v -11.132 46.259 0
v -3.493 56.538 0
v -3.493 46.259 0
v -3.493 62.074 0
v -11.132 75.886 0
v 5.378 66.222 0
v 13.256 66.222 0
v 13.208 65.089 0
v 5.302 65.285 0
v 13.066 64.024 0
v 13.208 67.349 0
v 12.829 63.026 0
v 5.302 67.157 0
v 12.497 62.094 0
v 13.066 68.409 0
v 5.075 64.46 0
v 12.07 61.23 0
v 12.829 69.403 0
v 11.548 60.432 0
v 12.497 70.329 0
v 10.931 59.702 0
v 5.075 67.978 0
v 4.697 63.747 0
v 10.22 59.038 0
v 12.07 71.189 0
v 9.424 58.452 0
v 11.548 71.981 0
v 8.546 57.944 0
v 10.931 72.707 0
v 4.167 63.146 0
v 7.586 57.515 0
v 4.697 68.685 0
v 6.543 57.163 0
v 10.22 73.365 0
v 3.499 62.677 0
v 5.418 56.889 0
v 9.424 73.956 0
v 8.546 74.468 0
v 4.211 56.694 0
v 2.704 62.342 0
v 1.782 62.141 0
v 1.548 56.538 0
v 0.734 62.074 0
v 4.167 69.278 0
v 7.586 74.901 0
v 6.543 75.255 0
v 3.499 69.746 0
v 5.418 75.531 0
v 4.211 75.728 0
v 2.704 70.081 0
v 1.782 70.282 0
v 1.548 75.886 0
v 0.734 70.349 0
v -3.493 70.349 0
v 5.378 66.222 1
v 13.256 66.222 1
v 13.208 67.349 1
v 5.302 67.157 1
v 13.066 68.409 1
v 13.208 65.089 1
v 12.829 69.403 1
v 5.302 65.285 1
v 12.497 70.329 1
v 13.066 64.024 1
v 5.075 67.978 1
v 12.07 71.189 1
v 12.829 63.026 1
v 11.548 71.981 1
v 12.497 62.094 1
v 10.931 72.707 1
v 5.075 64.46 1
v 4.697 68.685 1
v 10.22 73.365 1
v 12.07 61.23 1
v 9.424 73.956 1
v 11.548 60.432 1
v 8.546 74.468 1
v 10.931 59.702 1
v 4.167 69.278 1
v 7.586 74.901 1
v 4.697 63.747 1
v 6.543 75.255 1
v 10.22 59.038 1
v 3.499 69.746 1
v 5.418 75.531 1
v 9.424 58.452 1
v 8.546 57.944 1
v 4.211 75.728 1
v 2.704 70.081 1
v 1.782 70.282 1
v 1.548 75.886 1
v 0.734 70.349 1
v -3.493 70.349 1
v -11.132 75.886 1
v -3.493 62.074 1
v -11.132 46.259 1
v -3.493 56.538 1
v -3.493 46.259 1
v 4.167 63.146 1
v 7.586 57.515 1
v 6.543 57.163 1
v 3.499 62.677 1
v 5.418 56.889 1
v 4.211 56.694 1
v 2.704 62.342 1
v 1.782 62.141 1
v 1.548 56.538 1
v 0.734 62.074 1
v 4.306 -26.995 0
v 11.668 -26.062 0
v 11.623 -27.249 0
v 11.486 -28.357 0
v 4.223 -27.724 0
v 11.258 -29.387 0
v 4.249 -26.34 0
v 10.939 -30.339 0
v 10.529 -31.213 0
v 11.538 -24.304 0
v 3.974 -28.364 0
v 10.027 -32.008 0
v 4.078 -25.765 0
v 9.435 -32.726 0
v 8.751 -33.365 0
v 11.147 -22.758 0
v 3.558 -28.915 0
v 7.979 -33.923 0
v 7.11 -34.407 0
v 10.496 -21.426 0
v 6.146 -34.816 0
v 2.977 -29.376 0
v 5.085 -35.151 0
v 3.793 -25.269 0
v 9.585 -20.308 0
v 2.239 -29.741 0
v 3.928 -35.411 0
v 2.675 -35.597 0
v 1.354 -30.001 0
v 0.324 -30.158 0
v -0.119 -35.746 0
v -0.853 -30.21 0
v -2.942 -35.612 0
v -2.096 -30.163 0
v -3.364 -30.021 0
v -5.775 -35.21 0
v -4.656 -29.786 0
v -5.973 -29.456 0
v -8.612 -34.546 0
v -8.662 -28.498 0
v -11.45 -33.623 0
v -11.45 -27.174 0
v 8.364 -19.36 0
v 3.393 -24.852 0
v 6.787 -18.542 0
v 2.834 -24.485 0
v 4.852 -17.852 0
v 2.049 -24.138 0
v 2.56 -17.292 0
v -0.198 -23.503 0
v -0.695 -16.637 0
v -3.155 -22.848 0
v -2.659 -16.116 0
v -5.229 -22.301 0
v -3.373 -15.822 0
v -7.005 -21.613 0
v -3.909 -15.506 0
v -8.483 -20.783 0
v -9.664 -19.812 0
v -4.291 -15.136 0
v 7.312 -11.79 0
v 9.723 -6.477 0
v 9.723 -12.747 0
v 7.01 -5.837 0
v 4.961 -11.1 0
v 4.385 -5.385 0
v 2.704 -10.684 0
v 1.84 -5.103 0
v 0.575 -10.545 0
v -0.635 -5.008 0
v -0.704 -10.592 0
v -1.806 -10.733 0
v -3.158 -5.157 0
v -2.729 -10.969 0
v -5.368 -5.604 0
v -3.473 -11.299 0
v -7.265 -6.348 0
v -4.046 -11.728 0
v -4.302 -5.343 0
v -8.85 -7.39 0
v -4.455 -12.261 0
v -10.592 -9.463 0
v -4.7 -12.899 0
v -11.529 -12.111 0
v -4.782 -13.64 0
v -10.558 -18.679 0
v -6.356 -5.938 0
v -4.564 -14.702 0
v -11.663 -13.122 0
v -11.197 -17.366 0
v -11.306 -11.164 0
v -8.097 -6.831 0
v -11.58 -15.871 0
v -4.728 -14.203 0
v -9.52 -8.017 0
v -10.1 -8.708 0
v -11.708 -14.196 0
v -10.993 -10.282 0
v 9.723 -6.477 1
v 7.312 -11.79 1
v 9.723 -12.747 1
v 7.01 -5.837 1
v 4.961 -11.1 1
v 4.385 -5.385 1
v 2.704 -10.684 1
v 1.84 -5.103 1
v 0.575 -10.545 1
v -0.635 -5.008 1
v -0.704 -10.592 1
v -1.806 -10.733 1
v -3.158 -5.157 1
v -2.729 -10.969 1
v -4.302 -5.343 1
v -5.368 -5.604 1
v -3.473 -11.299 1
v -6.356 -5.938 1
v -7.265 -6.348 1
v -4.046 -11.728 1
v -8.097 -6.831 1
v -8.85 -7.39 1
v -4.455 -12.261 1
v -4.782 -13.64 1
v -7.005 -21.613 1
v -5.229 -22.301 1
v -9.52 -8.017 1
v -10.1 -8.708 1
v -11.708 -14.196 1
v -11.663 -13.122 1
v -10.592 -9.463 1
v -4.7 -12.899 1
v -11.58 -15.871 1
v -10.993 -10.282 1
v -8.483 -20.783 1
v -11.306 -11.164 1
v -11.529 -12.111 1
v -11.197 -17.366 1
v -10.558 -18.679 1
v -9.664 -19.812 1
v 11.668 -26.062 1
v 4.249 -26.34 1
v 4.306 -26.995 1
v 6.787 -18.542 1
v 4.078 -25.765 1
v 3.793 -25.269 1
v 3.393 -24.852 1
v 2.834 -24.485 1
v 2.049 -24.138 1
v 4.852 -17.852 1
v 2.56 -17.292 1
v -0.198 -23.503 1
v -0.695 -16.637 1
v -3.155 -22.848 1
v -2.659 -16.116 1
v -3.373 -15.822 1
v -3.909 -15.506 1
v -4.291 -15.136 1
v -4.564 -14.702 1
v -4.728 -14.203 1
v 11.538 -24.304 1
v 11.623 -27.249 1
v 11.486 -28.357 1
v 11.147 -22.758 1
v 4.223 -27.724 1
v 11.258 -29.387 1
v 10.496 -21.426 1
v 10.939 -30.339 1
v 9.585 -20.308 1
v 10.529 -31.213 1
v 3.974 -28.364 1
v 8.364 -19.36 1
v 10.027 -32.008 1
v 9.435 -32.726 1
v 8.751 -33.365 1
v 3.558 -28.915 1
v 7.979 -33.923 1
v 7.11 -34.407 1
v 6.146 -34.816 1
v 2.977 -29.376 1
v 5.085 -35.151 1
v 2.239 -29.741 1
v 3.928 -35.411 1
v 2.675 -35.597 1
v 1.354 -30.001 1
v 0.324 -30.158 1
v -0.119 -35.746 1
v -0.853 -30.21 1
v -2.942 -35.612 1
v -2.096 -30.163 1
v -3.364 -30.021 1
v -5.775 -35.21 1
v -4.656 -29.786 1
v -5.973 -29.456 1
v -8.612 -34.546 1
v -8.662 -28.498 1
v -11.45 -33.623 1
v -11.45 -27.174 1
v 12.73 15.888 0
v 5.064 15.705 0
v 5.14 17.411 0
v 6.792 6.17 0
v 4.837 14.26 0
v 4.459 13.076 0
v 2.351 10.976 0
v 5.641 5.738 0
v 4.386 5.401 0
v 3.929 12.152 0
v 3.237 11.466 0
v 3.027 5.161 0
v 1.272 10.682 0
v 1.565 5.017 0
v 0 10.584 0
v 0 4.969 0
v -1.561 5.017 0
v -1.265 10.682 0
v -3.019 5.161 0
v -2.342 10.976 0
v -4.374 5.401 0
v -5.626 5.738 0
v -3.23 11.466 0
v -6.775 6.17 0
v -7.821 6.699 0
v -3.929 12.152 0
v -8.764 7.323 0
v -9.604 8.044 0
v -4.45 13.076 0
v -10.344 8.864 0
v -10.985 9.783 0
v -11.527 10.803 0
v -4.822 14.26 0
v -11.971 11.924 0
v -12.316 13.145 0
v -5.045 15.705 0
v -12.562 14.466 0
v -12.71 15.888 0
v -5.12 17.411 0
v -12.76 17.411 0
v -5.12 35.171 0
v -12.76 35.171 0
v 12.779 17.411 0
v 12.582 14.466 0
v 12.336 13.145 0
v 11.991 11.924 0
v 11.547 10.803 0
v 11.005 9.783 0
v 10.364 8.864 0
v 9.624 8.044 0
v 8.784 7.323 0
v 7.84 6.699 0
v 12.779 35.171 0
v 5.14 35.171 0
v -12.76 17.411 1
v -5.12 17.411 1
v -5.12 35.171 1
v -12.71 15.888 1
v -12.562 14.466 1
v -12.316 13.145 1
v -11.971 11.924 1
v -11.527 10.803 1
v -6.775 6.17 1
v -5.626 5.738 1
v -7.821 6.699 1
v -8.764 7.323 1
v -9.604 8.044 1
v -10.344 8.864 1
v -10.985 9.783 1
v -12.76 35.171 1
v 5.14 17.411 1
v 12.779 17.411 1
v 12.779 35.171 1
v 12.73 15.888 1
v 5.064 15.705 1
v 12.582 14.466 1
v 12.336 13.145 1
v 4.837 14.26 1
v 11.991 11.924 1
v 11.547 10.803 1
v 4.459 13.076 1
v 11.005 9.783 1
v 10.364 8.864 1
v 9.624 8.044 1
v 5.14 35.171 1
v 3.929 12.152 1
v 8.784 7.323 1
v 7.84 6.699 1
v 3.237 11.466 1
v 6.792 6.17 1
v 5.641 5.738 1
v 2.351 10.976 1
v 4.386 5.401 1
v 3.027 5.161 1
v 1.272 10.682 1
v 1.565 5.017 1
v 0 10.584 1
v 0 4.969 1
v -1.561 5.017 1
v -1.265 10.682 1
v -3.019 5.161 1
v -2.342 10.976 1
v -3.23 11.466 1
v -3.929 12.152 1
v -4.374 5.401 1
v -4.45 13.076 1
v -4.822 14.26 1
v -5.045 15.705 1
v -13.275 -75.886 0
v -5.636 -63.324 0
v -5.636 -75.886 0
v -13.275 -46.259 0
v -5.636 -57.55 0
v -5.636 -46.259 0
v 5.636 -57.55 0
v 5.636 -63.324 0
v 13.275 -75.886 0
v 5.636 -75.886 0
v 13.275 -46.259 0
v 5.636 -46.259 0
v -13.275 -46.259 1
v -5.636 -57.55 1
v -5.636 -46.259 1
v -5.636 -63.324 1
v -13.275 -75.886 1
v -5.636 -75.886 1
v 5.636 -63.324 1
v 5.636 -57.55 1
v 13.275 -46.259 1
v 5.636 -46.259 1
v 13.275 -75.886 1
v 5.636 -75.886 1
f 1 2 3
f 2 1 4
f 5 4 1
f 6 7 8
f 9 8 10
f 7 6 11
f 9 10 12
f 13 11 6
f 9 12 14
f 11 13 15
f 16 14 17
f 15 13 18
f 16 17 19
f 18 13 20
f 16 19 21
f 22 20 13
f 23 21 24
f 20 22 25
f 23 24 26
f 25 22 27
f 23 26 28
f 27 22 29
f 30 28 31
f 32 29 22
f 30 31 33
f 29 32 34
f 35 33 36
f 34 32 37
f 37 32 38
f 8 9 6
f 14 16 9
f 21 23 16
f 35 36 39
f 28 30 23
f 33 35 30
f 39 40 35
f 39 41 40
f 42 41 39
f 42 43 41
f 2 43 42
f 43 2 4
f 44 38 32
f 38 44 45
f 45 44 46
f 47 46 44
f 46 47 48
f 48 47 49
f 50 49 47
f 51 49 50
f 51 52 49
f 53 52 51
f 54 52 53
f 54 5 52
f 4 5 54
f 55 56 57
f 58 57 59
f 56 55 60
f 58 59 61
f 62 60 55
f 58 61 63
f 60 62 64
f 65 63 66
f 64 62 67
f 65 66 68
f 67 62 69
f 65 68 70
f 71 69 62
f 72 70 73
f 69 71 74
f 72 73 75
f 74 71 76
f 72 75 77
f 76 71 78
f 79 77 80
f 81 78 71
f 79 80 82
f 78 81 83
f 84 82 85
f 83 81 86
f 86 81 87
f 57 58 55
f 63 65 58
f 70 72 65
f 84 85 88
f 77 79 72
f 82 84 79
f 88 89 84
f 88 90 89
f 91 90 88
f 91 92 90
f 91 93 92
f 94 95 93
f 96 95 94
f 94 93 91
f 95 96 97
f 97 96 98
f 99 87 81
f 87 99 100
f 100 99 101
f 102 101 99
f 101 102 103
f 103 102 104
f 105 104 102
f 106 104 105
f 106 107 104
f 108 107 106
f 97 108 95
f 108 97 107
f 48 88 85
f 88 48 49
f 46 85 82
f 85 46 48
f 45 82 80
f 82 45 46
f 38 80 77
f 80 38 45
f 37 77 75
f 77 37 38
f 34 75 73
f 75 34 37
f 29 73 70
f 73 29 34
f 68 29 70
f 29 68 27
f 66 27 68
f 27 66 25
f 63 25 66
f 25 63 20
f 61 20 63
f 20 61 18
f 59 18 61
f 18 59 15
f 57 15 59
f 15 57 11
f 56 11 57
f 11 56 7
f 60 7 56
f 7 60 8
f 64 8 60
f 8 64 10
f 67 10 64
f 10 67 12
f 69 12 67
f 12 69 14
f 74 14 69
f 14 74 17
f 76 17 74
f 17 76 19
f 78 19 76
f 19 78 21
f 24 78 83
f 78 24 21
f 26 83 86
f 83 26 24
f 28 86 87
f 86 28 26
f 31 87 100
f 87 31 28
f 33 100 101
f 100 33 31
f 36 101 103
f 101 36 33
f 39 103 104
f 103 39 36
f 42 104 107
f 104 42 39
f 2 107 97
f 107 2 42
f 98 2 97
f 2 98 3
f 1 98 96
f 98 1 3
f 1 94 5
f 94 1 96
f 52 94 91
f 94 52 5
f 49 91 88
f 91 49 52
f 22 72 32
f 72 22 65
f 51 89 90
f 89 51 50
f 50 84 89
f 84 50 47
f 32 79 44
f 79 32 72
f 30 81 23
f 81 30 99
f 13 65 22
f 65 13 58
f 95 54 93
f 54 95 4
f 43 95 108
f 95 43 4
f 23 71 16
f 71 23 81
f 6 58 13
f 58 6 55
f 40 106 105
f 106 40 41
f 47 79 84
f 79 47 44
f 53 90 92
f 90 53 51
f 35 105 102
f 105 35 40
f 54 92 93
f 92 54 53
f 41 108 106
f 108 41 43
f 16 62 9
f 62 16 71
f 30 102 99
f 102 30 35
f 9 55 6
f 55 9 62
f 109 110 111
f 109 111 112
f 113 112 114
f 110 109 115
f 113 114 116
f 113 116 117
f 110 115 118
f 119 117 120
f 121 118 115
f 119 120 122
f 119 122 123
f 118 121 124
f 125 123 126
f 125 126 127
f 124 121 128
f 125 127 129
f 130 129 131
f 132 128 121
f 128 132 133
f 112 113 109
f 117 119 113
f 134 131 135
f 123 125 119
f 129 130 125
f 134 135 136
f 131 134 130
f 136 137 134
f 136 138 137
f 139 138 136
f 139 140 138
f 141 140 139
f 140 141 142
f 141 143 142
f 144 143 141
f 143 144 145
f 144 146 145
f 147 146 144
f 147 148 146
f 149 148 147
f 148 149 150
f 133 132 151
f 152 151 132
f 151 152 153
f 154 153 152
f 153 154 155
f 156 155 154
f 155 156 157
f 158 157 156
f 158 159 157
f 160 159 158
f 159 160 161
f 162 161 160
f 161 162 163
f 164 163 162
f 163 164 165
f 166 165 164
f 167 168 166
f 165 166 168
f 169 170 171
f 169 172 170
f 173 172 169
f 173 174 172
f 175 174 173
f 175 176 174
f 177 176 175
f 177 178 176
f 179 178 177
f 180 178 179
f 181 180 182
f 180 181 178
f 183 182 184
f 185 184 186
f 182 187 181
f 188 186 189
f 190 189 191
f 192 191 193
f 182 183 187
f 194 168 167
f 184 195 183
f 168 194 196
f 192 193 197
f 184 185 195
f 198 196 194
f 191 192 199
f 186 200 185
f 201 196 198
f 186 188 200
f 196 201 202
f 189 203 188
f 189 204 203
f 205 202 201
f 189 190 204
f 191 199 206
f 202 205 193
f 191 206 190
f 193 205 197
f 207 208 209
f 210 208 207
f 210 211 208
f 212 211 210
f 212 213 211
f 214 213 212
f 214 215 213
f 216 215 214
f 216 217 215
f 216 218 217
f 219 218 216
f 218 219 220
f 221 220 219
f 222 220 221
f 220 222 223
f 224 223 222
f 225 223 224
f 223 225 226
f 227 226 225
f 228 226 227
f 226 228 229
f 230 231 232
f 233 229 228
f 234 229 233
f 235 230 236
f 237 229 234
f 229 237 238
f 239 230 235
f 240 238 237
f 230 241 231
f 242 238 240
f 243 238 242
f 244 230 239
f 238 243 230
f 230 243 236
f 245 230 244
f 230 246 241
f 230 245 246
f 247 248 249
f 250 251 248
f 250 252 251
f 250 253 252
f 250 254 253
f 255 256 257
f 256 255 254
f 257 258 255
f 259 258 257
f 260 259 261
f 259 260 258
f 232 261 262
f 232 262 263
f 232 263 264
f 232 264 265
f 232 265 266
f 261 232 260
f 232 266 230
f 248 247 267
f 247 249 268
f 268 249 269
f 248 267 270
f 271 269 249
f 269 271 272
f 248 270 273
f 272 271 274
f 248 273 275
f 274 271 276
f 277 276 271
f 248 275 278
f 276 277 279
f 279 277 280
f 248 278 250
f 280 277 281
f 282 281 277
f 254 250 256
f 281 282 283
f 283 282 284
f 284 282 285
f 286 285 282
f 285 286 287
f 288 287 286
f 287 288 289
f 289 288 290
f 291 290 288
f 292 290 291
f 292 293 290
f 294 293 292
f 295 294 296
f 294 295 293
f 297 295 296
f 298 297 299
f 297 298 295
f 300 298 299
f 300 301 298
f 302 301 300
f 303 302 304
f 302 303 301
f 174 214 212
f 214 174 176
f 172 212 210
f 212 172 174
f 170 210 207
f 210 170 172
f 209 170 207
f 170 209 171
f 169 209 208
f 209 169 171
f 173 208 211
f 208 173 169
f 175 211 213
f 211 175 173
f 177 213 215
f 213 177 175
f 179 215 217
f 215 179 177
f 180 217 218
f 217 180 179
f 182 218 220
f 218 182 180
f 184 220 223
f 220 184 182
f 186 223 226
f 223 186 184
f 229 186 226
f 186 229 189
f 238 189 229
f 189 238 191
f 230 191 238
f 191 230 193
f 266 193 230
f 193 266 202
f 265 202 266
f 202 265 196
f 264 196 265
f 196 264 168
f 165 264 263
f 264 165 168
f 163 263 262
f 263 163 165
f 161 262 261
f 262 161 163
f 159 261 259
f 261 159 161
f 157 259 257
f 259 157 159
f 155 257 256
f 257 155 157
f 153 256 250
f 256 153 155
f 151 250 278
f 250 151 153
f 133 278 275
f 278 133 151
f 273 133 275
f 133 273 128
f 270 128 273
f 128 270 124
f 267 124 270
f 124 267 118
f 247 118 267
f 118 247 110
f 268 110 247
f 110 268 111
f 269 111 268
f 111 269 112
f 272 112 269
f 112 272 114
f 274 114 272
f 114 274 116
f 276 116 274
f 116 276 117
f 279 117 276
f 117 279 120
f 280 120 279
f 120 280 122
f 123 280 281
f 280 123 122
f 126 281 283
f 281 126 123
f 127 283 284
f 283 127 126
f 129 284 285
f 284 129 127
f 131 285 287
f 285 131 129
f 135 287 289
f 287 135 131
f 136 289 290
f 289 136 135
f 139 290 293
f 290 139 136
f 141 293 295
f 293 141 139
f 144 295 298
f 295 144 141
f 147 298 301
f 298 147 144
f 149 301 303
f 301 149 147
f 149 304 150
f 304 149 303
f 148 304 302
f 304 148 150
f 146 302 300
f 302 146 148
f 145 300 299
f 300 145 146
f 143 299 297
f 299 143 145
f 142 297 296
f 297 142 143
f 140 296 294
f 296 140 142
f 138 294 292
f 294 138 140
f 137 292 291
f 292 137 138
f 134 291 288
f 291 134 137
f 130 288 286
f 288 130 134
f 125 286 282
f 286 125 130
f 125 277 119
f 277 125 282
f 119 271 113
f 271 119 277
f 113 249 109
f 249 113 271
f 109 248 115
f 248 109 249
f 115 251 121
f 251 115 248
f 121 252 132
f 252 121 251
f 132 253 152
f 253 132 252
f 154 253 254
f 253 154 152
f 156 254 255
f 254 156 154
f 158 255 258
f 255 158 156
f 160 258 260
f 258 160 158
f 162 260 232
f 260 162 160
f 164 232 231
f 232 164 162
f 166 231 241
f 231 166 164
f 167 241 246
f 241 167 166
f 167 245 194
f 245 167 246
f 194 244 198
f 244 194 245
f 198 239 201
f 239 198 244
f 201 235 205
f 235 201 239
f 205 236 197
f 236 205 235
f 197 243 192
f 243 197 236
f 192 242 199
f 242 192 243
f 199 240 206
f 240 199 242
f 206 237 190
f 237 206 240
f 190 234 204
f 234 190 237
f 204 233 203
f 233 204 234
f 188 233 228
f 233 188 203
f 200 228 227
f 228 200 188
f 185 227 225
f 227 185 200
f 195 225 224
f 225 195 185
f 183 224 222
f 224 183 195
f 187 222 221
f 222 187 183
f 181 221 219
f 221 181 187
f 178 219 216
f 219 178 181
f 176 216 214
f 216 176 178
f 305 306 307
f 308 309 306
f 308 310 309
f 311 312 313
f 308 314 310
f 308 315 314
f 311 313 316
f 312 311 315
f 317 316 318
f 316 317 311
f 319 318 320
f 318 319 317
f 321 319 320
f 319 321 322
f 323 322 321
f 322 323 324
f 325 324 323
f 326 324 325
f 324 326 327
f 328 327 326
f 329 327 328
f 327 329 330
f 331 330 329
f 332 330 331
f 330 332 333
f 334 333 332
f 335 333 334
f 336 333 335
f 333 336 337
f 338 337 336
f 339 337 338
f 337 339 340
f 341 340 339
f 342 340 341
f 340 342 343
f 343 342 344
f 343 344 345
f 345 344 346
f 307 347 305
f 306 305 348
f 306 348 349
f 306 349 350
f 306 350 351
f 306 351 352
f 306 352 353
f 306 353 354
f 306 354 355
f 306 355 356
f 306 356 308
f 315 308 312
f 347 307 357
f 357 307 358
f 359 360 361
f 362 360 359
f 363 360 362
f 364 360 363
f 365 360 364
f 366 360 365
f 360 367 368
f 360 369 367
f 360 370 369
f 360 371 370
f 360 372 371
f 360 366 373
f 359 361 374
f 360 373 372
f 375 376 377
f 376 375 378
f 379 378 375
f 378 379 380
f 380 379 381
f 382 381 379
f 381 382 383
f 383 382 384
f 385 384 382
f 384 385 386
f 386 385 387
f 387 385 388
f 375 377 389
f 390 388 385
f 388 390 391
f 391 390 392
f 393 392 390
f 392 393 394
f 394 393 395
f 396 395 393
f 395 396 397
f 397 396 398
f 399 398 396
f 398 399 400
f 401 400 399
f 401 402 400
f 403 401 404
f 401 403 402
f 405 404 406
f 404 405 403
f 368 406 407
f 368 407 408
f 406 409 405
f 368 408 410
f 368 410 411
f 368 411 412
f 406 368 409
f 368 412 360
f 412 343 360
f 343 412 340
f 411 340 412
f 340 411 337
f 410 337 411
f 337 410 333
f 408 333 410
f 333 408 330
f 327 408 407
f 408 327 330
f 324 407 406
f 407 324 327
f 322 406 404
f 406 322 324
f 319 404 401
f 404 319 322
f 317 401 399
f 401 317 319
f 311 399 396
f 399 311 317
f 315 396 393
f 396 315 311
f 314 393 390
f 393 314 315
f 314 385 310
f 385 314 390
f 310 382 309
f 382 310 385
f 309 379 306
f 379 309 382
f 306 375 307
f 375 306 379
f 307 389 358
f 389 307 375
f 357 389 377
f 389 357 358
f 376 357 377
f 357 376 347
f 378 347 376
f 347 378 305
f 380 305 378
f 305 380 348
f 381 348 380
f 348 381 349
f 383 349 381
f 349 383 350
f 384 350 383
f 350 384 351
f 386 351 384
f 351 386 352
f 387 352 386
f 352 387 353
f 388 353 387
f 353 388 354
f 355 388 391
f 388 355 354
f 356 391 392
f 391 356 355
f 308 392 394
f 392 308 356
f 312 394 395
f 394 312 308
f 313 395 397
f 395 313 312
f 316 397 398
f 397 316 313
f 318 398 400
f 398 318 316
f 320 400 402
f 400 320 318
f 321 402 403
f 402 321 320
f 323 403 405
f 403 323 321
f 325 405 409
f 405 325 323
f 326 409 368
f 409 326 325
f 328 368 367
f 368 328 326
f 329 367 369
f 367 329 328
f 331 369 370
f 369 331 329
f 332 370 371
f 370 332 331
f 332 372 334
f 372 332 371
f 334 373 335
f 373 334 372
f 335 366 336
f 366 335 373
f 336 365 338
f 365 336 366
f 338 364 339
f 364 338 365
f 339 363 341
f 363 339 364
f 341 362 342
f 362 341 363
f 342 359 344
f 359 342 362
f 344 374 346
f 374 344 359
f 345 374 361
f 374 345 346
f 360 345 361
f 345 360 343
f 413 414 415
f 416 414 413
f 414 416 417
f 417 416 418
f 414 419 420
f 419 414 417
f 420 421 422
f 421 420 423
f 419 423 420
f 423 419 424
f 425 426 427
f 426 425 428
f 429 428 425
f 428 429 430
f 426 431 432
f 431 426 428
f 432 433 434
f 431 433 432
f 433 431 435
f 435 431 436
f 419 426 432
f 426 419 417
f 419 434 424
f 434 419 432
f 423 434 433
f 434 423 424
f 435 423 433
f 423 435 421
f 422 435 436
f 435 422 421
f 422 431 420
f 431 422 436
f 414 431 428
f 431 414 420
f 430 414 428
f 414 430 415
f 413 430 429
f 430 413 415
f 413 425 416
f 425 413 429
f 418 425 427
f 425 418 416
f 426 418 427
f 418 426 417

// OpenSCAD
// Module names are of the form poly_<inkscape-path-id>().  As a result,
// you can associate a polygon in this OpenSCAD program with the corresponding
// SVG element in the Inkscape document by looking for the XML element with
// the attribute id="inkscape-path-id".

// fudge value is used to ensure that subtracted solids are a tad taller
// in the z dimension than the polygon being subtracted from.  This helps
// keep the resulting .stl file manifold.
fudge = 0.1;

module poly_path2990(h)
{
  scale([25.4/90, -25.4/90, 1]) union()
  {
    difference()
    {
       linear_extrude(height=h)
         polygon([[-39.445310,-268.885770],[5.484380,-268.885770],[14.919395,-268.327609],[19.198559,-267.629963],[23.185492,-266.653275],[26.880197,-265.397543],[30.282673,-263.862769],[33.392921,-262.048951],[36.210940,-259.956090],[38.732271,-257.622564],[40.917428,-255.051743],[42.766413,-252.243624],[44.279225,-249.198210],[45.455864,-245.915499],[46.296332,-242.395493],[46.800627,-238.638189],[46.968750,-234.643590],[46.800627,-230.631362],[46.296332,-226.856446],[45.455864,-223.318841],[44.279225,-220.018546],[42.766413,-216.955561],[40.917428,-214.129886],[38.732271,-211.541519],[36.210940,-209.190460],[33.392921,-207.114031],[30.282673,-205.314462],[26.880197,-203.791752],[23.185492,-202.545901],[19.198559,-201.576910],[14.919395,-200.884778],[5.484380,-200.331090],[-12.375000,-200.331090],[-12.375000,-163.909210],[-39.445310,-163.909210],[-39.445310,-268.885770]]);
       translate([0, 0, -fudge])
         linear_extrude(height=h+2*fudge)
           polygon([[-12.375000,-249.268590],[-12.375000,-219.948270],[2.601560,-219.948270],[6.314906,-220.185546],[9.580033,-220.897450],[12.396941,-222.083984],[14.765630,-223.745150],[16.642053,-225.876461],[17.982371,-228.403304],[18.786584,-231.325680],[19.054690,-234.643590],[18.786584,-237.957021],[17.982371,-240.866184],[16.642053,-243.371080],[14.765630,-245.471710],[12.396941,-247.132797],[9.580033,-248.319305],[6.314906,-249.031235],[2.601560,-249.268590],[-12.375000,-249.268590]]);
    }
  }
}

module poly_path2994(h)
{
  scale([25.4/90, -25.4/90, 1]) union()
  {
    linear_extrude(height=h)
      polygon([[34.453130,22.948910],[34.453130,45.167660],[25.910101,41.775147],[17.578130,39.331730],[9.580036,37.855228],[2.039060,37.362980],[-2.496119,37.530018],[-6.398470,38.031010],[-9.667994,38.865955],[-12.304690,40.034850],[-14.334981,41.555404],[-15.785183,43.445069],[-16.655293,45.703845],[-16.945310,48.331730],[-16.751973,50.326886],[-16.171903,52.093499],[-15.205098,53.631570],[-13.851560,54.941100],[-11.953147,56.061742],[-9.421905,57.103259],[-2.460940,58.948910],[9.070310,61.269230],[17.191365,63.255590],[24.046819,65.698959],[29.636675,68.599338],[33.960940,71.956730],[37.190867,75.920619],[39.497979,80.640351],[40.882273,86.115928],[41.343750,92.347350],[41.182222,96.550727],[40.697704,100.477245],[39.890196,104.126906],[38.759699,107.499709],[37.306212,110.595654],[35.529735,113.414743],[33.430267,115.956974],[31.007810,118.222350],[28.271093,120.199889],[25.193808,121.913756],[21.775953,123.363952],[18.017529,124.550475],[13.918535,125.473327],[9.478970,126.132506],[-0.421870,126.659850],[-10.423859,126.185241],[-20.460940,124.761410],[-30.515640,122.405945],[-40.570310,119.136410],[-40.570310,96.284850],[-30.691419,100.978224],[-21.164060,104.370790],[-16.497091,105.539746],[-11.917999,106.374709],[-7.426782,106.875680],[-3.023440,107.042660],[1.146941,106.858102],[4.798786,106.304396],[7.932098,105.381543],[10.546880,104.089540],[12.607878,102.454786],[14.080033,100.503618],[14.963343,98.236036],[15.257810,95.652040],[15.055627,93.331744],[14.449170,91.292688],[13.438440,89.534869],[12.023440,88.058290],[10.041471,86.757531],[7.259723,85.527070],[-0.703120,83.277040],[-11.179690,80.956730],[-18.527362,79.018765],[-24.820334,76.579809],[-30.058609,73.639858],[-34.242190,70.198910],[-37.410649,66.186740],[-39.673833,61.532945],[-41.031739,56.237525],[-41.484370,50.300480],[-41.326171,46.493742],[-40.851565,42.913317],[-40.060552,39.559203],[-38.953131,36.431400],[-37.529303,33.529908],[-35.789067,30.854726],[-33.732423,28.405853],[-31.359370,26.183290],[-28.689702,24.205784],[-25.743177,22.491940],[-22.519793,21.041759],[-19.019551,19.855240],[-15.242451,18.932384],[-11.188493,18.273190],[-2.250000,17.745790],[6.521440,18.079853],[15.539060,19.081730],[24.837834,20.681413],[34.453130,22.948910]]);
  }
}

module poly_path2992(h)
{
  scale([25.4/90, -25.4/90, 1]) union()
  {
    linear_extrude(height=h)
      polygon([[-45.210940,-124.620790],[-18.140620,-124.620790],[-18.140620,-61.691100],[-17.876971,-55.648601],[-17.085962,-50.528968],[-15.767596,-46.332198],[-13.921870,-43.058290],[-11.443386,-40.628100],[-8.296914,-38.892256],[-4.482452,-37.850756],[0.000000,-37.503600],[4.508755,-37.850756],[8.331985,-38.892256],[11.469693,-40.628100],[13.921880,-43.058290],[15.798302,-46.332198],[17.138618,-50.528968],[17.942830,-55.648601],[18.210940,-61.691100],[18.210940,-124.620790],[45.281250,-124.620790],[45.281250,-61.691100],[45.106535,-56.296805],[44.582464,-51.258470],[43.709037,-46.576095],[42.486254,-42.249679],[40.914115,-38.279222],[38.992620,-34.664723],[36.721768,-31.406183],[34.101560,-28.503600],[31.123139,-25.949280],[27.777784,-23.735537],[24.065494,-21.862369],[19.986269,-20.329776],[15.540107,-19.137759],[10.727009,-18.286318],[5.546973,-17.775451],[0.000000,-17.605160],[-5.530532,-17.775451],[-10.696312,-18.286318],[-15.497341,-19.137759],[-19.933620,-20.329776],[-24.005150,-21.862369],[-27.711931,-23.735537],[-31.053964,-25.949280],[-34.031250,-28.503600],[-36.651494,-31.406183],[-38.922371,-34.664723],[-40.843882,-38.279222],[-42.416026,-42.249679],[-43.638804,-46.576095],[-44.512215,-51.258470],[-45.036261,-56.296805],[-45.210940,-61.691100],[-45.210940,-124.620790]]);
  }
}

module poly_path2996(h)
{
  scale([25.4/90, -25.4/90, 1]) union()
  {
    linear_extrude(height=h)
      polygon([[-47.039060,163.909210],[-19.968750,163.909210],[-19.968750,203.917020],[19.968750,203.917020],[19.968750,163.909210],[47.039060,163.909210],[47.039060,268.885770],[19.968750,268.885770],[19.968750,224.377960],[-19.968750,224.377960],[-19.968750,268.885770],[-47.039060,268.885770]]);
  }
}

poly_path2990(1);
poly_path2994(1);
poly_path2992(1);
poly_path2996(1);
